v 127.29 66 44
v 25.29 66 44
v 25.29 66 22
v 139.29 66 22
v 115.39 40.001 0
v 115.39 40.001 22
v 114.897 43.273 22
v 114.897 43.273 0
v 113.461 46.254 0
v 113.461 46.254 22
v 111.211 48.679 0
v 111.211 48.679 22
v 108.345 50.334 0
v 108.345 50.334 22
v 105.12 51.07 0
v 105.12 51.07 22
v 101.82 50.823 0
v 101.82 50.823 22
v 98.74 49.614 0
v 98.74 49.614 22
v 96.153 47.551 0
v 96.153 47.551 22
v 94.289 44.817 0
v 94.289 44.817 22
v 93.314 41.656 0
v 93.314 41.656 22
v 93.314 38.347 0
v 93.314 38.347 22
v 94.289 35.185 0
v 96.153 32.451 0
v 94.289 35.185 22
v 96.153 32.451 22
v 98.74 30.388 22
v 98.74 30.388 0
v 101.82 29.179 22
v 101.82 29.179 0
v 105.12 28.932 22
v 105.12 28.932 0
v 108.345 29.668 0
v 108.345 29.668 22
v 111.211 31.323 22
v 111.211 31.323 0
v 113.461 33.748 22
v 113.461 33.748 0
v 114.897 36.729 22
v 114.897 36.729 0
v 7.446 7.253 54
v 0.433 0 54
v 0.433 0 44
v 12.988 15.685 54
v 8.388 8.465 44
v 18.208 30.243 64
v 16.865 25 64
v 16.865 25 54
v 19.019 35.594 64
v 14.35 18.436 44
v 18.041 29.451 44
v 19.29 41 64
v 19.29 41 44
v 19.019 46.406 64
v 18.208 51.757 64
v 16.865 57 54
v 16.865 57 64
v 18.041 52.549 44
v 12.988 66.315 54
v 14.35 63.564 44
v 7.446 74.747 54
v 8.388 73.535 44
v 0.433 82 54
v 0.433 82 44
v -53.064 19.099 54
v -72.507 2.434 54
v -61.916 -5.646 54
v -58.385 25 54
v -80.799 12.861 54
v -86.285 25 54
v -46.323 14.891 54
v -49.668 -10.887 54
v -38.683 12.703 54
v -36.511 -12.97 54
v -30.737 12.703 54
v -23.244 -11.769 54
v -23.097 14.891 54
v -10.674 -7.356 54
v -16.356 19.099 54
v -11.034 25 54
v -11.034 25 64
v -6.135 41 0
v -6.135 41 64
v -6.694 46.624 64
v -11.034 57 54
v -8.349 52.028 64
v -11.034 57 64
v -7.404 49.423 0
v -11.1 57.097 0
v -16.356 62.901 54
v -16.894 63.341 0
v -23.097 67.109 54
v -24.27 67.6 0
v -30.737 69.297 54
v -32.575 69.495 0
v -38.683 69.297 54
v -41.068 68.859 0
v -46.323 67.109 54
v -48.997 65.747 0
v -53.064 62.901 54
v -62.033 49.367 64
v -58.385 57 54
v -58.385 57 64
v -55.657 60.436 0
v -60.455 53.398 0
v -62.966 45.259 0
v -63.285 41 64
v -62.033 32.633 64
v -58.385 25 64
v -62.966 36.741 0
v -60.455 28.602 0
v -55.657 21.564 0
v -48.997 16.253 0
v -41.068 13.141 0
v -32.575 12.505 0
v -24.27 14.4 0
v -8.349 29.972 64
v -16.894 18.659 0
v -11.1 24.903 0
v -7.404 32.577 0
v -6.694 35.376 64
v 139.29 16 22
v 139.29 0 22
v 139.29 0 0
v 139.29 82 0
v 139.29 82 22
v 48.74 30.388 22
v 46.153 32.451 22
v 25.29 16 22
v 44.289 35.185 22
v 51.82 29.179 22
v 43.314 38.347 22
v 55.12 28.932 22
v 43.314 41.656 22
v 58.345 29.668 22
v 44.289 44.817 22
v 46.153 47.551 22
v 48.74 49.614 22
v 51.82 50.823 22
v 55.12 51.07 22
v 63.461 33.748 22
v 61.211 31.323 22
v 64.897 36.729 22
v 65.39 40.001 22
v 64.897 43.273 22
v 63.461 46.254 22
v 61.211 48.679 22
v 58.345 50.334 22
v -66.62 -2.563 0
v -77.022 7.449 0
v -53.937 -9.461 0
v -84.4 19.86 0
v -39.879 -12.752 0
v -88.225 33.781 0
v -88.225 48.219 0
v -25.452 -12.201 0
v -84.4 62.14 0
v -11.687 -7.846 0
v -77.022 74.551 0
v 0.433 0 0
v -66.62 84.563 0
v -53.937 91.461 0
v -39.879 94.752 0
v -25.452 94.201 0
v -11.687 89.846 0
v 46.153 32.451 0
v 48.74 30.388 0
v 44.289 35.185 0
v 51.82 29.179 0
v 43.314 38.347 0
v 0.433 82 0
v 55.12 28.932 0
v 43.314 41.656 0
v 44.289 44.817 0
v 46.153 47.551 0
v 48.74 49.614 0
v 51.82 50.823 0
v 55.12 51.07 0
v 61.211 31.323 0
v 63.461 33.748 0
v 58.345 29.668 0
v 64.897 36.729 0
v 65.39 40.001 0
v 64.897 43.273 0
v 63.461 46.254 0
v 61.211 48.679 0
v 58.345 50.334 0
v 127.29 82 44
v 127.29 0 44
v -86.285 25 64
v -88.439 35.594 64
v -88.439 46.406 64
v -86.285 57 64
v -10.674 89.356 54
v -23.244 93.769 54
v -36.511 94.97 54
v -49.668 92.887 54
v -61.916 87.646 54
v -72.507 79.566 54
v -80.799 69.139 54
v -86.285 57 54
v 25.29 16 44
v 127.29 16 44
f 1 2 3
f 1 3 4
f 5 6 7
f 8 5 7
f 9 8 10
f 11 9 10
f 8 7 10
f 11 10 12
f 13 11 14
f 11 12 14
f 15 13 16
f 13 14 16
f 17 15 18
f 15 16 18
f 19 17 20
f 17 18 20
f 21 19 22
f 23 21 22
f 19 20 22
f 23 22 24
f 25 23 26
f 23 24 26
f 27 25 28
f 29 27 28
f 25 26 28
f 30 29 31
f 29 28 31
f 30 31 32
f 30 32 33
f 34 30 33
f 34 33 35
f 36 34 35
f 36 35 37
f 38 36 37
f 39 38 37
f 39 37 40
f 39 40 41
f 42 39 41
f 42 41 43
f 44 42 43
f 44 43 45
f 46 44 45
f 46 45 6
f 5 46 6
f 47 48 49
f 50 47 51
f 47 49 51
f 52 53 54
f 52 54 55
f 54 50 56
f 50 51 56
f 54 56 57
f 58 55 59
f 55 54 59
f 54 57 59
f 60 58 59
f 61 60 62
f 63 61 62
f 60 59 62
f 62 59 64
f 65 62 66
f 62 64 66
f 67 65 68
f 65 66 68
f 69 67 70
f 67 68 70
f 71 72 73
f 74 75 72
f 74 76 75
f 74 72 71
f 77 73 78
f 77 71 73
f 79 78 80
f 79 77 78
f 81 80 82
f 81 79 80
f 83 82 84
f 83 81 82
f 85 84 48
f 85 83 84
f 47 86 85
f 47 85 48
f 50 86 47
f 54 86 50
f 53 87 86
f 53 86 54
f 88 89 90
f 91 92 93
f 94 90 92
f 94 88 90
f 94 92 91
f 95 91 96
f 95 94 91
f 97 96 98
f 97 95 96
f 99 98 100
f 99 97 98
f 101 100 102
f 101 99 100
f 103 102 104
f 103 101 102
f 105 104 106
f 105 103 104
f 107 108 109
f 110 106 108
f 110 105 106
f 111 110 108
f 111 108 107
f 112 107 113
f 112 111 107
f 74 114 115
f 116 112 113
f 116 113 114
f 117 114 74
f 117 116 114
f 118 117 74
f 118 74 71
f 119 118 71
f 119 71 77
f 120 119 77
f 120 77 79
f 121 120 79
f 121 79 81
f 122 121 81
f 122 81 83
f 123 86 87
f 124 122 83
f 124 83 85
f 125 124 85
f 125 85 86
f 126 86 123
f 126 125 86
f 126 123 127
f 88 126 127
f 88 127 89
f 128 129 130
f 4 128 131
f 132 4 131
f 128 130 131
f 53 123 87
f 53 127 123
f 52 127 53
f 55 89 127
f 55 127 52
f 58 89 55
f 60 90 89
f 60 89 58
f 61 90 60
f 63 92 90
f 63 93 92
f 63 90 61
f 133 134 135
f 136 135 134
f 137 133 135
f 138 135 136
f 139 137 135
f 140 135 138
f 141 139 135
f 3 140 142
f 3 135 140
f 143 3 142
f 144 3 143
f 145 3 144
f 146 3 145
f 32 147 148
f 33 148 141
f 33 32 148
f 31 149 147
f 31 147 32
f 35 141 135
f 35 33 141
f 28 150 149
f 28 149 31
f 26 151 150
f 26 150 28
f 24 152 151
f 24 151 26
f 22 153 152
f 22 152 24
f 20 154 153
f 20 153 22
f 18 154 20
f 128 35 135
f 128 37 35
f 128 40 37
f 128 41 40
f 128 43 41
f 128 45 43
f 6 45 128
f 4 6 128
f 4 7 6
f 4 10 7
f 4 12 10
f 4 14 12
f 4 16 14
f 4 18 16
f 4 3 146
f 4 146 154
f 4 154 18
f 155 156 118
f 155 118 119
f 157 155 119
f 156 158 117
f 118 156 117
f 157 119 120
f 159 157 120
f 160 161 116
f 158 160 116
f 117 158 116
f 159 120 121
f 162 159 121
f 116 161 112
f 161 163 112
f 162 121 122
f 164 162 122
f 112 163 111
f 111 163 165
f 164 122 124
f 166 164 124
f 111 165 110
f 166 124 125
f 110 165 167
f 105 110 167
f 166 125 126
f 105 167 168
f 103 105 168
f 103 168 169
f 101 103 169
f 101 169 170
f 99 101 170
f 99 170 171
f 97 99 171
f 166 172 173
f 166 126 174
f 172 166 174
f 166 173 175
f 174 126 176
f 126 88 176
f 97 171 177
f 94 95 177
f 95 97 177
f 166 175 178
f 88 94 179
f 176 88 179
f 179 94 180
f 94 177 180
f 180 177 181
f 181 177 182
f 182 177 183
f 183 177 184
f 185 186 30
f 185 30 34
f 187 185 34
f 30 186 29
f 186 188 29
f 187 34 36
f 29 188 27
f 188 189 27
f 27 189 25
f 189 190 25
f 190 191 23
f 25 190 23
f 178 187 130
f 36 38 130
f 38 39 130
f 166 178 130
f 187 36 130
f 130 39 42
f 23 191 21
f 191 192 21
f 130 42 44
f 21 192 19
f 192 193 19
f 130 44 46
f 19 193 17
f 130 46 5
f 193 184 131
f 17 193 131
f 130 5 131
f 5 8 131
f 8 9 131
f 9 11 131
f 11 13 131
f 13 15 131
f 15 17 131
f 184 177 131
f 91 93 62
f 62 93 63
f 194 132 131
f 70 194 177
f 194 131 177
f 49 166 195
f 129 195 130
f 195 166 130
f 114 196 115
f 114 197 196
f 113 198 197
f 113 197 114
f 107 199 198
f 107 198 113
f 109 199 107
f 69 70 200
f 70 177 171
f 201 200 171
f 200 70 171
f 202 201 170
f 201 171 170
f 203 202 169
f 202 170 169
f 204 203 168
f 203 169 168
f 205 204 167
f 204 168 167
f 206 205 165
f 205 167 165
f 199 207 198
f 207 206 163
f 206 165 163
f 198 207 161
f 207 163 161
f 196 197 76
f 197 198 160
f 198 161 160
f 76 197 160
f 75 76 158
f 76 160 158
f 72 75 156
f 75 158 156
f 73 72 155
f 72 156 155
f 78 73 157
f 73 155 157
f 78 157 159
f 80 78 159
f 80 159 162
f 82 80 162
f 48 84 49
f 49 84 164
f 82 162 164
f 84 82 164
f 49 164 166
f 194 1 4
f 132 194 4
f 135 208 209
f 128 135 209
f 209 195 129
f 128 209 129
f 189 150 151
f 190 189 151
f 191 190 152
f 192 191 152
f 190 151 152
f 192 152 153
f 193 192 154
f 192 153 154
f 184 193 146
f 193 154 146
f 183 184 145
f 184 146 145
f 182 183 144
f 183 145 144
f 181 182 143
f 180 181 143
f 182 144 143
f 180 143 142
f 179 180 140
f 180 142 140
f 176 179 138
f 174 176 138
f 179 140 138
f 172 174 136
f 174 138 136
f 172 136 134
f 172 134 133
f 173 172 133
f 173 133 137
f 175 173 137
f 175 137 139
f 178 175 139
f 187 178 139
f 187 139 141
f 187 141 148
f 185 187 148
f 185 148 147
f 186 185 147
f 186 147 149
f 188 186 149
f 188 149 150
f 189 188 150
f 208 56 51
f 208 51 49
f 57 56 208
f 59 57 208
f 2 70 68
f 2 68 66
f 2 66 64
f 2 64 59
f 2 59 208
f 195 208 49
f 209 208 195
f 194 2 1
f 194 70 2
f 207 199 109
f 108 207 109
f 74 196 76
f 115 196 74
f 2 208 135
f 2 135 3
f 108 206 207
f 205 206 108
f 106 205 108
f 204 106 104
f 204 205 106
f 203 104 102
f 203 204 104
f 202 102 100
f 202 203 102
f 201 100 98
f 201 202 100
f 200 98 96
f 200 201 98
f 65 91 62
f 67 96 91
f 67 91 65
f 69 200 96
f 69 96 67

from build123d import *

# Parameters (mm, degrees)
F0_R      = 28.575
F1_DEPTH  = 64
F2_DEPTH  = 44
F3_W      = 103.150376
F3_H      = 49.648258
F3_H_2    = 43.694865
F4_DEPTH  = 10
F5_W      = 114
F5_H      = 50
F6_DEPTH  = 22
F8_DEPTH  = 95.001
F9_R      = 11.1
F10_DEPTH = 22.001


with BuildPart() as f1:
    # F0 (on Top) → F1 (new body)
    with BuildSketch(Plane.XY):
        with BuildLine():
            Line((0.432614, 0), (0, 0))
            Line((0, 0), (0, 82))
            Line((0, 82), (0.432614, 82))
            ThreePointArc((0.432614, 82), (-88.709953, 41), (0.432614, 0))
        make_face()
        with Locations((-34.709953, 41)):
            Circle(F0_R, mode=Mode.SUBTRACT)
        with BuildLine():
            Line((0, 82), (0, 0))
            Line((0, 0), (0.432614, 0))
            ThreePointArc((0.432614, 0), (14.349698, 18.435632), (19.290047, 41))
            ThreePointArc((19.290047, 41), (14.349698, 63.564368), (0.432614, 82))
            Line((0.432614, 82), (0, 82))
        make_face()
    extrude(amount=F1_DEPTH)

    # F0 (on Top) → F2 (join)
    with BuildSketch(Plane.XY):
        with BuildLine():
            ThreePointArc((19.290047, 41), (14.349698, 18.435632), (0.432614, 0))
            Line((0.432614, 0), (139.29, 0))
            Line((139.29, 0), (139.29, 82))
            Line((139.29, 82), (0.432614, 82))
            ThreePointArc((0.432614, 82), (14.349698, 63.564368), (19.290047, 41))
        make_face()
    extrude(amount=F2_DEPTH)

    # F3 (on face) → F4 (cut)
    with BuildSketch(Plane.XY.offset(64)):
        with Locations((-34.709953, 0.175871)):
            Rectangle(F3_W, F3_H)
        with Locations((-34.709953, 78.847432)):
            Rectangle(F3_W, F3_H_2)
    extrude(amount=-F4_DEPTH, mode=Mode.SUBTRACT)

    # F5 (on face) → F6 (cut)
    with BuildSketch(Plane.XY.offset(44)):
        with Locations((82.29, 41)):
            Rectangle(F5_W, F5_H)
    extrude(amount=-F6_DEPTH, mode=Mode.SUBTRACT)

    # F7 (on face) → F8 (cut, through all)
    with BuildSketch(Plane.XZ):
        Polygon((139.29, 22), (139.29, 44), (127.29, 44), align=None)
    extrude(amount=-F8_DEPTH, mode=Mode.SUBTRACT)

    # F9 (on face) → F10 (cut, through all)
    with BuildSketch(Plane.XY.offset(22)):
        with Locations((54.29, 40.001135)):
            Circle(F9_R)
        with Locations((104.29, 40.001135)):
            Circle(F9_R)
    extrude(amount=-F10_DEPTH, mode=Mode.SUBTRACT)


solid = f1.part
